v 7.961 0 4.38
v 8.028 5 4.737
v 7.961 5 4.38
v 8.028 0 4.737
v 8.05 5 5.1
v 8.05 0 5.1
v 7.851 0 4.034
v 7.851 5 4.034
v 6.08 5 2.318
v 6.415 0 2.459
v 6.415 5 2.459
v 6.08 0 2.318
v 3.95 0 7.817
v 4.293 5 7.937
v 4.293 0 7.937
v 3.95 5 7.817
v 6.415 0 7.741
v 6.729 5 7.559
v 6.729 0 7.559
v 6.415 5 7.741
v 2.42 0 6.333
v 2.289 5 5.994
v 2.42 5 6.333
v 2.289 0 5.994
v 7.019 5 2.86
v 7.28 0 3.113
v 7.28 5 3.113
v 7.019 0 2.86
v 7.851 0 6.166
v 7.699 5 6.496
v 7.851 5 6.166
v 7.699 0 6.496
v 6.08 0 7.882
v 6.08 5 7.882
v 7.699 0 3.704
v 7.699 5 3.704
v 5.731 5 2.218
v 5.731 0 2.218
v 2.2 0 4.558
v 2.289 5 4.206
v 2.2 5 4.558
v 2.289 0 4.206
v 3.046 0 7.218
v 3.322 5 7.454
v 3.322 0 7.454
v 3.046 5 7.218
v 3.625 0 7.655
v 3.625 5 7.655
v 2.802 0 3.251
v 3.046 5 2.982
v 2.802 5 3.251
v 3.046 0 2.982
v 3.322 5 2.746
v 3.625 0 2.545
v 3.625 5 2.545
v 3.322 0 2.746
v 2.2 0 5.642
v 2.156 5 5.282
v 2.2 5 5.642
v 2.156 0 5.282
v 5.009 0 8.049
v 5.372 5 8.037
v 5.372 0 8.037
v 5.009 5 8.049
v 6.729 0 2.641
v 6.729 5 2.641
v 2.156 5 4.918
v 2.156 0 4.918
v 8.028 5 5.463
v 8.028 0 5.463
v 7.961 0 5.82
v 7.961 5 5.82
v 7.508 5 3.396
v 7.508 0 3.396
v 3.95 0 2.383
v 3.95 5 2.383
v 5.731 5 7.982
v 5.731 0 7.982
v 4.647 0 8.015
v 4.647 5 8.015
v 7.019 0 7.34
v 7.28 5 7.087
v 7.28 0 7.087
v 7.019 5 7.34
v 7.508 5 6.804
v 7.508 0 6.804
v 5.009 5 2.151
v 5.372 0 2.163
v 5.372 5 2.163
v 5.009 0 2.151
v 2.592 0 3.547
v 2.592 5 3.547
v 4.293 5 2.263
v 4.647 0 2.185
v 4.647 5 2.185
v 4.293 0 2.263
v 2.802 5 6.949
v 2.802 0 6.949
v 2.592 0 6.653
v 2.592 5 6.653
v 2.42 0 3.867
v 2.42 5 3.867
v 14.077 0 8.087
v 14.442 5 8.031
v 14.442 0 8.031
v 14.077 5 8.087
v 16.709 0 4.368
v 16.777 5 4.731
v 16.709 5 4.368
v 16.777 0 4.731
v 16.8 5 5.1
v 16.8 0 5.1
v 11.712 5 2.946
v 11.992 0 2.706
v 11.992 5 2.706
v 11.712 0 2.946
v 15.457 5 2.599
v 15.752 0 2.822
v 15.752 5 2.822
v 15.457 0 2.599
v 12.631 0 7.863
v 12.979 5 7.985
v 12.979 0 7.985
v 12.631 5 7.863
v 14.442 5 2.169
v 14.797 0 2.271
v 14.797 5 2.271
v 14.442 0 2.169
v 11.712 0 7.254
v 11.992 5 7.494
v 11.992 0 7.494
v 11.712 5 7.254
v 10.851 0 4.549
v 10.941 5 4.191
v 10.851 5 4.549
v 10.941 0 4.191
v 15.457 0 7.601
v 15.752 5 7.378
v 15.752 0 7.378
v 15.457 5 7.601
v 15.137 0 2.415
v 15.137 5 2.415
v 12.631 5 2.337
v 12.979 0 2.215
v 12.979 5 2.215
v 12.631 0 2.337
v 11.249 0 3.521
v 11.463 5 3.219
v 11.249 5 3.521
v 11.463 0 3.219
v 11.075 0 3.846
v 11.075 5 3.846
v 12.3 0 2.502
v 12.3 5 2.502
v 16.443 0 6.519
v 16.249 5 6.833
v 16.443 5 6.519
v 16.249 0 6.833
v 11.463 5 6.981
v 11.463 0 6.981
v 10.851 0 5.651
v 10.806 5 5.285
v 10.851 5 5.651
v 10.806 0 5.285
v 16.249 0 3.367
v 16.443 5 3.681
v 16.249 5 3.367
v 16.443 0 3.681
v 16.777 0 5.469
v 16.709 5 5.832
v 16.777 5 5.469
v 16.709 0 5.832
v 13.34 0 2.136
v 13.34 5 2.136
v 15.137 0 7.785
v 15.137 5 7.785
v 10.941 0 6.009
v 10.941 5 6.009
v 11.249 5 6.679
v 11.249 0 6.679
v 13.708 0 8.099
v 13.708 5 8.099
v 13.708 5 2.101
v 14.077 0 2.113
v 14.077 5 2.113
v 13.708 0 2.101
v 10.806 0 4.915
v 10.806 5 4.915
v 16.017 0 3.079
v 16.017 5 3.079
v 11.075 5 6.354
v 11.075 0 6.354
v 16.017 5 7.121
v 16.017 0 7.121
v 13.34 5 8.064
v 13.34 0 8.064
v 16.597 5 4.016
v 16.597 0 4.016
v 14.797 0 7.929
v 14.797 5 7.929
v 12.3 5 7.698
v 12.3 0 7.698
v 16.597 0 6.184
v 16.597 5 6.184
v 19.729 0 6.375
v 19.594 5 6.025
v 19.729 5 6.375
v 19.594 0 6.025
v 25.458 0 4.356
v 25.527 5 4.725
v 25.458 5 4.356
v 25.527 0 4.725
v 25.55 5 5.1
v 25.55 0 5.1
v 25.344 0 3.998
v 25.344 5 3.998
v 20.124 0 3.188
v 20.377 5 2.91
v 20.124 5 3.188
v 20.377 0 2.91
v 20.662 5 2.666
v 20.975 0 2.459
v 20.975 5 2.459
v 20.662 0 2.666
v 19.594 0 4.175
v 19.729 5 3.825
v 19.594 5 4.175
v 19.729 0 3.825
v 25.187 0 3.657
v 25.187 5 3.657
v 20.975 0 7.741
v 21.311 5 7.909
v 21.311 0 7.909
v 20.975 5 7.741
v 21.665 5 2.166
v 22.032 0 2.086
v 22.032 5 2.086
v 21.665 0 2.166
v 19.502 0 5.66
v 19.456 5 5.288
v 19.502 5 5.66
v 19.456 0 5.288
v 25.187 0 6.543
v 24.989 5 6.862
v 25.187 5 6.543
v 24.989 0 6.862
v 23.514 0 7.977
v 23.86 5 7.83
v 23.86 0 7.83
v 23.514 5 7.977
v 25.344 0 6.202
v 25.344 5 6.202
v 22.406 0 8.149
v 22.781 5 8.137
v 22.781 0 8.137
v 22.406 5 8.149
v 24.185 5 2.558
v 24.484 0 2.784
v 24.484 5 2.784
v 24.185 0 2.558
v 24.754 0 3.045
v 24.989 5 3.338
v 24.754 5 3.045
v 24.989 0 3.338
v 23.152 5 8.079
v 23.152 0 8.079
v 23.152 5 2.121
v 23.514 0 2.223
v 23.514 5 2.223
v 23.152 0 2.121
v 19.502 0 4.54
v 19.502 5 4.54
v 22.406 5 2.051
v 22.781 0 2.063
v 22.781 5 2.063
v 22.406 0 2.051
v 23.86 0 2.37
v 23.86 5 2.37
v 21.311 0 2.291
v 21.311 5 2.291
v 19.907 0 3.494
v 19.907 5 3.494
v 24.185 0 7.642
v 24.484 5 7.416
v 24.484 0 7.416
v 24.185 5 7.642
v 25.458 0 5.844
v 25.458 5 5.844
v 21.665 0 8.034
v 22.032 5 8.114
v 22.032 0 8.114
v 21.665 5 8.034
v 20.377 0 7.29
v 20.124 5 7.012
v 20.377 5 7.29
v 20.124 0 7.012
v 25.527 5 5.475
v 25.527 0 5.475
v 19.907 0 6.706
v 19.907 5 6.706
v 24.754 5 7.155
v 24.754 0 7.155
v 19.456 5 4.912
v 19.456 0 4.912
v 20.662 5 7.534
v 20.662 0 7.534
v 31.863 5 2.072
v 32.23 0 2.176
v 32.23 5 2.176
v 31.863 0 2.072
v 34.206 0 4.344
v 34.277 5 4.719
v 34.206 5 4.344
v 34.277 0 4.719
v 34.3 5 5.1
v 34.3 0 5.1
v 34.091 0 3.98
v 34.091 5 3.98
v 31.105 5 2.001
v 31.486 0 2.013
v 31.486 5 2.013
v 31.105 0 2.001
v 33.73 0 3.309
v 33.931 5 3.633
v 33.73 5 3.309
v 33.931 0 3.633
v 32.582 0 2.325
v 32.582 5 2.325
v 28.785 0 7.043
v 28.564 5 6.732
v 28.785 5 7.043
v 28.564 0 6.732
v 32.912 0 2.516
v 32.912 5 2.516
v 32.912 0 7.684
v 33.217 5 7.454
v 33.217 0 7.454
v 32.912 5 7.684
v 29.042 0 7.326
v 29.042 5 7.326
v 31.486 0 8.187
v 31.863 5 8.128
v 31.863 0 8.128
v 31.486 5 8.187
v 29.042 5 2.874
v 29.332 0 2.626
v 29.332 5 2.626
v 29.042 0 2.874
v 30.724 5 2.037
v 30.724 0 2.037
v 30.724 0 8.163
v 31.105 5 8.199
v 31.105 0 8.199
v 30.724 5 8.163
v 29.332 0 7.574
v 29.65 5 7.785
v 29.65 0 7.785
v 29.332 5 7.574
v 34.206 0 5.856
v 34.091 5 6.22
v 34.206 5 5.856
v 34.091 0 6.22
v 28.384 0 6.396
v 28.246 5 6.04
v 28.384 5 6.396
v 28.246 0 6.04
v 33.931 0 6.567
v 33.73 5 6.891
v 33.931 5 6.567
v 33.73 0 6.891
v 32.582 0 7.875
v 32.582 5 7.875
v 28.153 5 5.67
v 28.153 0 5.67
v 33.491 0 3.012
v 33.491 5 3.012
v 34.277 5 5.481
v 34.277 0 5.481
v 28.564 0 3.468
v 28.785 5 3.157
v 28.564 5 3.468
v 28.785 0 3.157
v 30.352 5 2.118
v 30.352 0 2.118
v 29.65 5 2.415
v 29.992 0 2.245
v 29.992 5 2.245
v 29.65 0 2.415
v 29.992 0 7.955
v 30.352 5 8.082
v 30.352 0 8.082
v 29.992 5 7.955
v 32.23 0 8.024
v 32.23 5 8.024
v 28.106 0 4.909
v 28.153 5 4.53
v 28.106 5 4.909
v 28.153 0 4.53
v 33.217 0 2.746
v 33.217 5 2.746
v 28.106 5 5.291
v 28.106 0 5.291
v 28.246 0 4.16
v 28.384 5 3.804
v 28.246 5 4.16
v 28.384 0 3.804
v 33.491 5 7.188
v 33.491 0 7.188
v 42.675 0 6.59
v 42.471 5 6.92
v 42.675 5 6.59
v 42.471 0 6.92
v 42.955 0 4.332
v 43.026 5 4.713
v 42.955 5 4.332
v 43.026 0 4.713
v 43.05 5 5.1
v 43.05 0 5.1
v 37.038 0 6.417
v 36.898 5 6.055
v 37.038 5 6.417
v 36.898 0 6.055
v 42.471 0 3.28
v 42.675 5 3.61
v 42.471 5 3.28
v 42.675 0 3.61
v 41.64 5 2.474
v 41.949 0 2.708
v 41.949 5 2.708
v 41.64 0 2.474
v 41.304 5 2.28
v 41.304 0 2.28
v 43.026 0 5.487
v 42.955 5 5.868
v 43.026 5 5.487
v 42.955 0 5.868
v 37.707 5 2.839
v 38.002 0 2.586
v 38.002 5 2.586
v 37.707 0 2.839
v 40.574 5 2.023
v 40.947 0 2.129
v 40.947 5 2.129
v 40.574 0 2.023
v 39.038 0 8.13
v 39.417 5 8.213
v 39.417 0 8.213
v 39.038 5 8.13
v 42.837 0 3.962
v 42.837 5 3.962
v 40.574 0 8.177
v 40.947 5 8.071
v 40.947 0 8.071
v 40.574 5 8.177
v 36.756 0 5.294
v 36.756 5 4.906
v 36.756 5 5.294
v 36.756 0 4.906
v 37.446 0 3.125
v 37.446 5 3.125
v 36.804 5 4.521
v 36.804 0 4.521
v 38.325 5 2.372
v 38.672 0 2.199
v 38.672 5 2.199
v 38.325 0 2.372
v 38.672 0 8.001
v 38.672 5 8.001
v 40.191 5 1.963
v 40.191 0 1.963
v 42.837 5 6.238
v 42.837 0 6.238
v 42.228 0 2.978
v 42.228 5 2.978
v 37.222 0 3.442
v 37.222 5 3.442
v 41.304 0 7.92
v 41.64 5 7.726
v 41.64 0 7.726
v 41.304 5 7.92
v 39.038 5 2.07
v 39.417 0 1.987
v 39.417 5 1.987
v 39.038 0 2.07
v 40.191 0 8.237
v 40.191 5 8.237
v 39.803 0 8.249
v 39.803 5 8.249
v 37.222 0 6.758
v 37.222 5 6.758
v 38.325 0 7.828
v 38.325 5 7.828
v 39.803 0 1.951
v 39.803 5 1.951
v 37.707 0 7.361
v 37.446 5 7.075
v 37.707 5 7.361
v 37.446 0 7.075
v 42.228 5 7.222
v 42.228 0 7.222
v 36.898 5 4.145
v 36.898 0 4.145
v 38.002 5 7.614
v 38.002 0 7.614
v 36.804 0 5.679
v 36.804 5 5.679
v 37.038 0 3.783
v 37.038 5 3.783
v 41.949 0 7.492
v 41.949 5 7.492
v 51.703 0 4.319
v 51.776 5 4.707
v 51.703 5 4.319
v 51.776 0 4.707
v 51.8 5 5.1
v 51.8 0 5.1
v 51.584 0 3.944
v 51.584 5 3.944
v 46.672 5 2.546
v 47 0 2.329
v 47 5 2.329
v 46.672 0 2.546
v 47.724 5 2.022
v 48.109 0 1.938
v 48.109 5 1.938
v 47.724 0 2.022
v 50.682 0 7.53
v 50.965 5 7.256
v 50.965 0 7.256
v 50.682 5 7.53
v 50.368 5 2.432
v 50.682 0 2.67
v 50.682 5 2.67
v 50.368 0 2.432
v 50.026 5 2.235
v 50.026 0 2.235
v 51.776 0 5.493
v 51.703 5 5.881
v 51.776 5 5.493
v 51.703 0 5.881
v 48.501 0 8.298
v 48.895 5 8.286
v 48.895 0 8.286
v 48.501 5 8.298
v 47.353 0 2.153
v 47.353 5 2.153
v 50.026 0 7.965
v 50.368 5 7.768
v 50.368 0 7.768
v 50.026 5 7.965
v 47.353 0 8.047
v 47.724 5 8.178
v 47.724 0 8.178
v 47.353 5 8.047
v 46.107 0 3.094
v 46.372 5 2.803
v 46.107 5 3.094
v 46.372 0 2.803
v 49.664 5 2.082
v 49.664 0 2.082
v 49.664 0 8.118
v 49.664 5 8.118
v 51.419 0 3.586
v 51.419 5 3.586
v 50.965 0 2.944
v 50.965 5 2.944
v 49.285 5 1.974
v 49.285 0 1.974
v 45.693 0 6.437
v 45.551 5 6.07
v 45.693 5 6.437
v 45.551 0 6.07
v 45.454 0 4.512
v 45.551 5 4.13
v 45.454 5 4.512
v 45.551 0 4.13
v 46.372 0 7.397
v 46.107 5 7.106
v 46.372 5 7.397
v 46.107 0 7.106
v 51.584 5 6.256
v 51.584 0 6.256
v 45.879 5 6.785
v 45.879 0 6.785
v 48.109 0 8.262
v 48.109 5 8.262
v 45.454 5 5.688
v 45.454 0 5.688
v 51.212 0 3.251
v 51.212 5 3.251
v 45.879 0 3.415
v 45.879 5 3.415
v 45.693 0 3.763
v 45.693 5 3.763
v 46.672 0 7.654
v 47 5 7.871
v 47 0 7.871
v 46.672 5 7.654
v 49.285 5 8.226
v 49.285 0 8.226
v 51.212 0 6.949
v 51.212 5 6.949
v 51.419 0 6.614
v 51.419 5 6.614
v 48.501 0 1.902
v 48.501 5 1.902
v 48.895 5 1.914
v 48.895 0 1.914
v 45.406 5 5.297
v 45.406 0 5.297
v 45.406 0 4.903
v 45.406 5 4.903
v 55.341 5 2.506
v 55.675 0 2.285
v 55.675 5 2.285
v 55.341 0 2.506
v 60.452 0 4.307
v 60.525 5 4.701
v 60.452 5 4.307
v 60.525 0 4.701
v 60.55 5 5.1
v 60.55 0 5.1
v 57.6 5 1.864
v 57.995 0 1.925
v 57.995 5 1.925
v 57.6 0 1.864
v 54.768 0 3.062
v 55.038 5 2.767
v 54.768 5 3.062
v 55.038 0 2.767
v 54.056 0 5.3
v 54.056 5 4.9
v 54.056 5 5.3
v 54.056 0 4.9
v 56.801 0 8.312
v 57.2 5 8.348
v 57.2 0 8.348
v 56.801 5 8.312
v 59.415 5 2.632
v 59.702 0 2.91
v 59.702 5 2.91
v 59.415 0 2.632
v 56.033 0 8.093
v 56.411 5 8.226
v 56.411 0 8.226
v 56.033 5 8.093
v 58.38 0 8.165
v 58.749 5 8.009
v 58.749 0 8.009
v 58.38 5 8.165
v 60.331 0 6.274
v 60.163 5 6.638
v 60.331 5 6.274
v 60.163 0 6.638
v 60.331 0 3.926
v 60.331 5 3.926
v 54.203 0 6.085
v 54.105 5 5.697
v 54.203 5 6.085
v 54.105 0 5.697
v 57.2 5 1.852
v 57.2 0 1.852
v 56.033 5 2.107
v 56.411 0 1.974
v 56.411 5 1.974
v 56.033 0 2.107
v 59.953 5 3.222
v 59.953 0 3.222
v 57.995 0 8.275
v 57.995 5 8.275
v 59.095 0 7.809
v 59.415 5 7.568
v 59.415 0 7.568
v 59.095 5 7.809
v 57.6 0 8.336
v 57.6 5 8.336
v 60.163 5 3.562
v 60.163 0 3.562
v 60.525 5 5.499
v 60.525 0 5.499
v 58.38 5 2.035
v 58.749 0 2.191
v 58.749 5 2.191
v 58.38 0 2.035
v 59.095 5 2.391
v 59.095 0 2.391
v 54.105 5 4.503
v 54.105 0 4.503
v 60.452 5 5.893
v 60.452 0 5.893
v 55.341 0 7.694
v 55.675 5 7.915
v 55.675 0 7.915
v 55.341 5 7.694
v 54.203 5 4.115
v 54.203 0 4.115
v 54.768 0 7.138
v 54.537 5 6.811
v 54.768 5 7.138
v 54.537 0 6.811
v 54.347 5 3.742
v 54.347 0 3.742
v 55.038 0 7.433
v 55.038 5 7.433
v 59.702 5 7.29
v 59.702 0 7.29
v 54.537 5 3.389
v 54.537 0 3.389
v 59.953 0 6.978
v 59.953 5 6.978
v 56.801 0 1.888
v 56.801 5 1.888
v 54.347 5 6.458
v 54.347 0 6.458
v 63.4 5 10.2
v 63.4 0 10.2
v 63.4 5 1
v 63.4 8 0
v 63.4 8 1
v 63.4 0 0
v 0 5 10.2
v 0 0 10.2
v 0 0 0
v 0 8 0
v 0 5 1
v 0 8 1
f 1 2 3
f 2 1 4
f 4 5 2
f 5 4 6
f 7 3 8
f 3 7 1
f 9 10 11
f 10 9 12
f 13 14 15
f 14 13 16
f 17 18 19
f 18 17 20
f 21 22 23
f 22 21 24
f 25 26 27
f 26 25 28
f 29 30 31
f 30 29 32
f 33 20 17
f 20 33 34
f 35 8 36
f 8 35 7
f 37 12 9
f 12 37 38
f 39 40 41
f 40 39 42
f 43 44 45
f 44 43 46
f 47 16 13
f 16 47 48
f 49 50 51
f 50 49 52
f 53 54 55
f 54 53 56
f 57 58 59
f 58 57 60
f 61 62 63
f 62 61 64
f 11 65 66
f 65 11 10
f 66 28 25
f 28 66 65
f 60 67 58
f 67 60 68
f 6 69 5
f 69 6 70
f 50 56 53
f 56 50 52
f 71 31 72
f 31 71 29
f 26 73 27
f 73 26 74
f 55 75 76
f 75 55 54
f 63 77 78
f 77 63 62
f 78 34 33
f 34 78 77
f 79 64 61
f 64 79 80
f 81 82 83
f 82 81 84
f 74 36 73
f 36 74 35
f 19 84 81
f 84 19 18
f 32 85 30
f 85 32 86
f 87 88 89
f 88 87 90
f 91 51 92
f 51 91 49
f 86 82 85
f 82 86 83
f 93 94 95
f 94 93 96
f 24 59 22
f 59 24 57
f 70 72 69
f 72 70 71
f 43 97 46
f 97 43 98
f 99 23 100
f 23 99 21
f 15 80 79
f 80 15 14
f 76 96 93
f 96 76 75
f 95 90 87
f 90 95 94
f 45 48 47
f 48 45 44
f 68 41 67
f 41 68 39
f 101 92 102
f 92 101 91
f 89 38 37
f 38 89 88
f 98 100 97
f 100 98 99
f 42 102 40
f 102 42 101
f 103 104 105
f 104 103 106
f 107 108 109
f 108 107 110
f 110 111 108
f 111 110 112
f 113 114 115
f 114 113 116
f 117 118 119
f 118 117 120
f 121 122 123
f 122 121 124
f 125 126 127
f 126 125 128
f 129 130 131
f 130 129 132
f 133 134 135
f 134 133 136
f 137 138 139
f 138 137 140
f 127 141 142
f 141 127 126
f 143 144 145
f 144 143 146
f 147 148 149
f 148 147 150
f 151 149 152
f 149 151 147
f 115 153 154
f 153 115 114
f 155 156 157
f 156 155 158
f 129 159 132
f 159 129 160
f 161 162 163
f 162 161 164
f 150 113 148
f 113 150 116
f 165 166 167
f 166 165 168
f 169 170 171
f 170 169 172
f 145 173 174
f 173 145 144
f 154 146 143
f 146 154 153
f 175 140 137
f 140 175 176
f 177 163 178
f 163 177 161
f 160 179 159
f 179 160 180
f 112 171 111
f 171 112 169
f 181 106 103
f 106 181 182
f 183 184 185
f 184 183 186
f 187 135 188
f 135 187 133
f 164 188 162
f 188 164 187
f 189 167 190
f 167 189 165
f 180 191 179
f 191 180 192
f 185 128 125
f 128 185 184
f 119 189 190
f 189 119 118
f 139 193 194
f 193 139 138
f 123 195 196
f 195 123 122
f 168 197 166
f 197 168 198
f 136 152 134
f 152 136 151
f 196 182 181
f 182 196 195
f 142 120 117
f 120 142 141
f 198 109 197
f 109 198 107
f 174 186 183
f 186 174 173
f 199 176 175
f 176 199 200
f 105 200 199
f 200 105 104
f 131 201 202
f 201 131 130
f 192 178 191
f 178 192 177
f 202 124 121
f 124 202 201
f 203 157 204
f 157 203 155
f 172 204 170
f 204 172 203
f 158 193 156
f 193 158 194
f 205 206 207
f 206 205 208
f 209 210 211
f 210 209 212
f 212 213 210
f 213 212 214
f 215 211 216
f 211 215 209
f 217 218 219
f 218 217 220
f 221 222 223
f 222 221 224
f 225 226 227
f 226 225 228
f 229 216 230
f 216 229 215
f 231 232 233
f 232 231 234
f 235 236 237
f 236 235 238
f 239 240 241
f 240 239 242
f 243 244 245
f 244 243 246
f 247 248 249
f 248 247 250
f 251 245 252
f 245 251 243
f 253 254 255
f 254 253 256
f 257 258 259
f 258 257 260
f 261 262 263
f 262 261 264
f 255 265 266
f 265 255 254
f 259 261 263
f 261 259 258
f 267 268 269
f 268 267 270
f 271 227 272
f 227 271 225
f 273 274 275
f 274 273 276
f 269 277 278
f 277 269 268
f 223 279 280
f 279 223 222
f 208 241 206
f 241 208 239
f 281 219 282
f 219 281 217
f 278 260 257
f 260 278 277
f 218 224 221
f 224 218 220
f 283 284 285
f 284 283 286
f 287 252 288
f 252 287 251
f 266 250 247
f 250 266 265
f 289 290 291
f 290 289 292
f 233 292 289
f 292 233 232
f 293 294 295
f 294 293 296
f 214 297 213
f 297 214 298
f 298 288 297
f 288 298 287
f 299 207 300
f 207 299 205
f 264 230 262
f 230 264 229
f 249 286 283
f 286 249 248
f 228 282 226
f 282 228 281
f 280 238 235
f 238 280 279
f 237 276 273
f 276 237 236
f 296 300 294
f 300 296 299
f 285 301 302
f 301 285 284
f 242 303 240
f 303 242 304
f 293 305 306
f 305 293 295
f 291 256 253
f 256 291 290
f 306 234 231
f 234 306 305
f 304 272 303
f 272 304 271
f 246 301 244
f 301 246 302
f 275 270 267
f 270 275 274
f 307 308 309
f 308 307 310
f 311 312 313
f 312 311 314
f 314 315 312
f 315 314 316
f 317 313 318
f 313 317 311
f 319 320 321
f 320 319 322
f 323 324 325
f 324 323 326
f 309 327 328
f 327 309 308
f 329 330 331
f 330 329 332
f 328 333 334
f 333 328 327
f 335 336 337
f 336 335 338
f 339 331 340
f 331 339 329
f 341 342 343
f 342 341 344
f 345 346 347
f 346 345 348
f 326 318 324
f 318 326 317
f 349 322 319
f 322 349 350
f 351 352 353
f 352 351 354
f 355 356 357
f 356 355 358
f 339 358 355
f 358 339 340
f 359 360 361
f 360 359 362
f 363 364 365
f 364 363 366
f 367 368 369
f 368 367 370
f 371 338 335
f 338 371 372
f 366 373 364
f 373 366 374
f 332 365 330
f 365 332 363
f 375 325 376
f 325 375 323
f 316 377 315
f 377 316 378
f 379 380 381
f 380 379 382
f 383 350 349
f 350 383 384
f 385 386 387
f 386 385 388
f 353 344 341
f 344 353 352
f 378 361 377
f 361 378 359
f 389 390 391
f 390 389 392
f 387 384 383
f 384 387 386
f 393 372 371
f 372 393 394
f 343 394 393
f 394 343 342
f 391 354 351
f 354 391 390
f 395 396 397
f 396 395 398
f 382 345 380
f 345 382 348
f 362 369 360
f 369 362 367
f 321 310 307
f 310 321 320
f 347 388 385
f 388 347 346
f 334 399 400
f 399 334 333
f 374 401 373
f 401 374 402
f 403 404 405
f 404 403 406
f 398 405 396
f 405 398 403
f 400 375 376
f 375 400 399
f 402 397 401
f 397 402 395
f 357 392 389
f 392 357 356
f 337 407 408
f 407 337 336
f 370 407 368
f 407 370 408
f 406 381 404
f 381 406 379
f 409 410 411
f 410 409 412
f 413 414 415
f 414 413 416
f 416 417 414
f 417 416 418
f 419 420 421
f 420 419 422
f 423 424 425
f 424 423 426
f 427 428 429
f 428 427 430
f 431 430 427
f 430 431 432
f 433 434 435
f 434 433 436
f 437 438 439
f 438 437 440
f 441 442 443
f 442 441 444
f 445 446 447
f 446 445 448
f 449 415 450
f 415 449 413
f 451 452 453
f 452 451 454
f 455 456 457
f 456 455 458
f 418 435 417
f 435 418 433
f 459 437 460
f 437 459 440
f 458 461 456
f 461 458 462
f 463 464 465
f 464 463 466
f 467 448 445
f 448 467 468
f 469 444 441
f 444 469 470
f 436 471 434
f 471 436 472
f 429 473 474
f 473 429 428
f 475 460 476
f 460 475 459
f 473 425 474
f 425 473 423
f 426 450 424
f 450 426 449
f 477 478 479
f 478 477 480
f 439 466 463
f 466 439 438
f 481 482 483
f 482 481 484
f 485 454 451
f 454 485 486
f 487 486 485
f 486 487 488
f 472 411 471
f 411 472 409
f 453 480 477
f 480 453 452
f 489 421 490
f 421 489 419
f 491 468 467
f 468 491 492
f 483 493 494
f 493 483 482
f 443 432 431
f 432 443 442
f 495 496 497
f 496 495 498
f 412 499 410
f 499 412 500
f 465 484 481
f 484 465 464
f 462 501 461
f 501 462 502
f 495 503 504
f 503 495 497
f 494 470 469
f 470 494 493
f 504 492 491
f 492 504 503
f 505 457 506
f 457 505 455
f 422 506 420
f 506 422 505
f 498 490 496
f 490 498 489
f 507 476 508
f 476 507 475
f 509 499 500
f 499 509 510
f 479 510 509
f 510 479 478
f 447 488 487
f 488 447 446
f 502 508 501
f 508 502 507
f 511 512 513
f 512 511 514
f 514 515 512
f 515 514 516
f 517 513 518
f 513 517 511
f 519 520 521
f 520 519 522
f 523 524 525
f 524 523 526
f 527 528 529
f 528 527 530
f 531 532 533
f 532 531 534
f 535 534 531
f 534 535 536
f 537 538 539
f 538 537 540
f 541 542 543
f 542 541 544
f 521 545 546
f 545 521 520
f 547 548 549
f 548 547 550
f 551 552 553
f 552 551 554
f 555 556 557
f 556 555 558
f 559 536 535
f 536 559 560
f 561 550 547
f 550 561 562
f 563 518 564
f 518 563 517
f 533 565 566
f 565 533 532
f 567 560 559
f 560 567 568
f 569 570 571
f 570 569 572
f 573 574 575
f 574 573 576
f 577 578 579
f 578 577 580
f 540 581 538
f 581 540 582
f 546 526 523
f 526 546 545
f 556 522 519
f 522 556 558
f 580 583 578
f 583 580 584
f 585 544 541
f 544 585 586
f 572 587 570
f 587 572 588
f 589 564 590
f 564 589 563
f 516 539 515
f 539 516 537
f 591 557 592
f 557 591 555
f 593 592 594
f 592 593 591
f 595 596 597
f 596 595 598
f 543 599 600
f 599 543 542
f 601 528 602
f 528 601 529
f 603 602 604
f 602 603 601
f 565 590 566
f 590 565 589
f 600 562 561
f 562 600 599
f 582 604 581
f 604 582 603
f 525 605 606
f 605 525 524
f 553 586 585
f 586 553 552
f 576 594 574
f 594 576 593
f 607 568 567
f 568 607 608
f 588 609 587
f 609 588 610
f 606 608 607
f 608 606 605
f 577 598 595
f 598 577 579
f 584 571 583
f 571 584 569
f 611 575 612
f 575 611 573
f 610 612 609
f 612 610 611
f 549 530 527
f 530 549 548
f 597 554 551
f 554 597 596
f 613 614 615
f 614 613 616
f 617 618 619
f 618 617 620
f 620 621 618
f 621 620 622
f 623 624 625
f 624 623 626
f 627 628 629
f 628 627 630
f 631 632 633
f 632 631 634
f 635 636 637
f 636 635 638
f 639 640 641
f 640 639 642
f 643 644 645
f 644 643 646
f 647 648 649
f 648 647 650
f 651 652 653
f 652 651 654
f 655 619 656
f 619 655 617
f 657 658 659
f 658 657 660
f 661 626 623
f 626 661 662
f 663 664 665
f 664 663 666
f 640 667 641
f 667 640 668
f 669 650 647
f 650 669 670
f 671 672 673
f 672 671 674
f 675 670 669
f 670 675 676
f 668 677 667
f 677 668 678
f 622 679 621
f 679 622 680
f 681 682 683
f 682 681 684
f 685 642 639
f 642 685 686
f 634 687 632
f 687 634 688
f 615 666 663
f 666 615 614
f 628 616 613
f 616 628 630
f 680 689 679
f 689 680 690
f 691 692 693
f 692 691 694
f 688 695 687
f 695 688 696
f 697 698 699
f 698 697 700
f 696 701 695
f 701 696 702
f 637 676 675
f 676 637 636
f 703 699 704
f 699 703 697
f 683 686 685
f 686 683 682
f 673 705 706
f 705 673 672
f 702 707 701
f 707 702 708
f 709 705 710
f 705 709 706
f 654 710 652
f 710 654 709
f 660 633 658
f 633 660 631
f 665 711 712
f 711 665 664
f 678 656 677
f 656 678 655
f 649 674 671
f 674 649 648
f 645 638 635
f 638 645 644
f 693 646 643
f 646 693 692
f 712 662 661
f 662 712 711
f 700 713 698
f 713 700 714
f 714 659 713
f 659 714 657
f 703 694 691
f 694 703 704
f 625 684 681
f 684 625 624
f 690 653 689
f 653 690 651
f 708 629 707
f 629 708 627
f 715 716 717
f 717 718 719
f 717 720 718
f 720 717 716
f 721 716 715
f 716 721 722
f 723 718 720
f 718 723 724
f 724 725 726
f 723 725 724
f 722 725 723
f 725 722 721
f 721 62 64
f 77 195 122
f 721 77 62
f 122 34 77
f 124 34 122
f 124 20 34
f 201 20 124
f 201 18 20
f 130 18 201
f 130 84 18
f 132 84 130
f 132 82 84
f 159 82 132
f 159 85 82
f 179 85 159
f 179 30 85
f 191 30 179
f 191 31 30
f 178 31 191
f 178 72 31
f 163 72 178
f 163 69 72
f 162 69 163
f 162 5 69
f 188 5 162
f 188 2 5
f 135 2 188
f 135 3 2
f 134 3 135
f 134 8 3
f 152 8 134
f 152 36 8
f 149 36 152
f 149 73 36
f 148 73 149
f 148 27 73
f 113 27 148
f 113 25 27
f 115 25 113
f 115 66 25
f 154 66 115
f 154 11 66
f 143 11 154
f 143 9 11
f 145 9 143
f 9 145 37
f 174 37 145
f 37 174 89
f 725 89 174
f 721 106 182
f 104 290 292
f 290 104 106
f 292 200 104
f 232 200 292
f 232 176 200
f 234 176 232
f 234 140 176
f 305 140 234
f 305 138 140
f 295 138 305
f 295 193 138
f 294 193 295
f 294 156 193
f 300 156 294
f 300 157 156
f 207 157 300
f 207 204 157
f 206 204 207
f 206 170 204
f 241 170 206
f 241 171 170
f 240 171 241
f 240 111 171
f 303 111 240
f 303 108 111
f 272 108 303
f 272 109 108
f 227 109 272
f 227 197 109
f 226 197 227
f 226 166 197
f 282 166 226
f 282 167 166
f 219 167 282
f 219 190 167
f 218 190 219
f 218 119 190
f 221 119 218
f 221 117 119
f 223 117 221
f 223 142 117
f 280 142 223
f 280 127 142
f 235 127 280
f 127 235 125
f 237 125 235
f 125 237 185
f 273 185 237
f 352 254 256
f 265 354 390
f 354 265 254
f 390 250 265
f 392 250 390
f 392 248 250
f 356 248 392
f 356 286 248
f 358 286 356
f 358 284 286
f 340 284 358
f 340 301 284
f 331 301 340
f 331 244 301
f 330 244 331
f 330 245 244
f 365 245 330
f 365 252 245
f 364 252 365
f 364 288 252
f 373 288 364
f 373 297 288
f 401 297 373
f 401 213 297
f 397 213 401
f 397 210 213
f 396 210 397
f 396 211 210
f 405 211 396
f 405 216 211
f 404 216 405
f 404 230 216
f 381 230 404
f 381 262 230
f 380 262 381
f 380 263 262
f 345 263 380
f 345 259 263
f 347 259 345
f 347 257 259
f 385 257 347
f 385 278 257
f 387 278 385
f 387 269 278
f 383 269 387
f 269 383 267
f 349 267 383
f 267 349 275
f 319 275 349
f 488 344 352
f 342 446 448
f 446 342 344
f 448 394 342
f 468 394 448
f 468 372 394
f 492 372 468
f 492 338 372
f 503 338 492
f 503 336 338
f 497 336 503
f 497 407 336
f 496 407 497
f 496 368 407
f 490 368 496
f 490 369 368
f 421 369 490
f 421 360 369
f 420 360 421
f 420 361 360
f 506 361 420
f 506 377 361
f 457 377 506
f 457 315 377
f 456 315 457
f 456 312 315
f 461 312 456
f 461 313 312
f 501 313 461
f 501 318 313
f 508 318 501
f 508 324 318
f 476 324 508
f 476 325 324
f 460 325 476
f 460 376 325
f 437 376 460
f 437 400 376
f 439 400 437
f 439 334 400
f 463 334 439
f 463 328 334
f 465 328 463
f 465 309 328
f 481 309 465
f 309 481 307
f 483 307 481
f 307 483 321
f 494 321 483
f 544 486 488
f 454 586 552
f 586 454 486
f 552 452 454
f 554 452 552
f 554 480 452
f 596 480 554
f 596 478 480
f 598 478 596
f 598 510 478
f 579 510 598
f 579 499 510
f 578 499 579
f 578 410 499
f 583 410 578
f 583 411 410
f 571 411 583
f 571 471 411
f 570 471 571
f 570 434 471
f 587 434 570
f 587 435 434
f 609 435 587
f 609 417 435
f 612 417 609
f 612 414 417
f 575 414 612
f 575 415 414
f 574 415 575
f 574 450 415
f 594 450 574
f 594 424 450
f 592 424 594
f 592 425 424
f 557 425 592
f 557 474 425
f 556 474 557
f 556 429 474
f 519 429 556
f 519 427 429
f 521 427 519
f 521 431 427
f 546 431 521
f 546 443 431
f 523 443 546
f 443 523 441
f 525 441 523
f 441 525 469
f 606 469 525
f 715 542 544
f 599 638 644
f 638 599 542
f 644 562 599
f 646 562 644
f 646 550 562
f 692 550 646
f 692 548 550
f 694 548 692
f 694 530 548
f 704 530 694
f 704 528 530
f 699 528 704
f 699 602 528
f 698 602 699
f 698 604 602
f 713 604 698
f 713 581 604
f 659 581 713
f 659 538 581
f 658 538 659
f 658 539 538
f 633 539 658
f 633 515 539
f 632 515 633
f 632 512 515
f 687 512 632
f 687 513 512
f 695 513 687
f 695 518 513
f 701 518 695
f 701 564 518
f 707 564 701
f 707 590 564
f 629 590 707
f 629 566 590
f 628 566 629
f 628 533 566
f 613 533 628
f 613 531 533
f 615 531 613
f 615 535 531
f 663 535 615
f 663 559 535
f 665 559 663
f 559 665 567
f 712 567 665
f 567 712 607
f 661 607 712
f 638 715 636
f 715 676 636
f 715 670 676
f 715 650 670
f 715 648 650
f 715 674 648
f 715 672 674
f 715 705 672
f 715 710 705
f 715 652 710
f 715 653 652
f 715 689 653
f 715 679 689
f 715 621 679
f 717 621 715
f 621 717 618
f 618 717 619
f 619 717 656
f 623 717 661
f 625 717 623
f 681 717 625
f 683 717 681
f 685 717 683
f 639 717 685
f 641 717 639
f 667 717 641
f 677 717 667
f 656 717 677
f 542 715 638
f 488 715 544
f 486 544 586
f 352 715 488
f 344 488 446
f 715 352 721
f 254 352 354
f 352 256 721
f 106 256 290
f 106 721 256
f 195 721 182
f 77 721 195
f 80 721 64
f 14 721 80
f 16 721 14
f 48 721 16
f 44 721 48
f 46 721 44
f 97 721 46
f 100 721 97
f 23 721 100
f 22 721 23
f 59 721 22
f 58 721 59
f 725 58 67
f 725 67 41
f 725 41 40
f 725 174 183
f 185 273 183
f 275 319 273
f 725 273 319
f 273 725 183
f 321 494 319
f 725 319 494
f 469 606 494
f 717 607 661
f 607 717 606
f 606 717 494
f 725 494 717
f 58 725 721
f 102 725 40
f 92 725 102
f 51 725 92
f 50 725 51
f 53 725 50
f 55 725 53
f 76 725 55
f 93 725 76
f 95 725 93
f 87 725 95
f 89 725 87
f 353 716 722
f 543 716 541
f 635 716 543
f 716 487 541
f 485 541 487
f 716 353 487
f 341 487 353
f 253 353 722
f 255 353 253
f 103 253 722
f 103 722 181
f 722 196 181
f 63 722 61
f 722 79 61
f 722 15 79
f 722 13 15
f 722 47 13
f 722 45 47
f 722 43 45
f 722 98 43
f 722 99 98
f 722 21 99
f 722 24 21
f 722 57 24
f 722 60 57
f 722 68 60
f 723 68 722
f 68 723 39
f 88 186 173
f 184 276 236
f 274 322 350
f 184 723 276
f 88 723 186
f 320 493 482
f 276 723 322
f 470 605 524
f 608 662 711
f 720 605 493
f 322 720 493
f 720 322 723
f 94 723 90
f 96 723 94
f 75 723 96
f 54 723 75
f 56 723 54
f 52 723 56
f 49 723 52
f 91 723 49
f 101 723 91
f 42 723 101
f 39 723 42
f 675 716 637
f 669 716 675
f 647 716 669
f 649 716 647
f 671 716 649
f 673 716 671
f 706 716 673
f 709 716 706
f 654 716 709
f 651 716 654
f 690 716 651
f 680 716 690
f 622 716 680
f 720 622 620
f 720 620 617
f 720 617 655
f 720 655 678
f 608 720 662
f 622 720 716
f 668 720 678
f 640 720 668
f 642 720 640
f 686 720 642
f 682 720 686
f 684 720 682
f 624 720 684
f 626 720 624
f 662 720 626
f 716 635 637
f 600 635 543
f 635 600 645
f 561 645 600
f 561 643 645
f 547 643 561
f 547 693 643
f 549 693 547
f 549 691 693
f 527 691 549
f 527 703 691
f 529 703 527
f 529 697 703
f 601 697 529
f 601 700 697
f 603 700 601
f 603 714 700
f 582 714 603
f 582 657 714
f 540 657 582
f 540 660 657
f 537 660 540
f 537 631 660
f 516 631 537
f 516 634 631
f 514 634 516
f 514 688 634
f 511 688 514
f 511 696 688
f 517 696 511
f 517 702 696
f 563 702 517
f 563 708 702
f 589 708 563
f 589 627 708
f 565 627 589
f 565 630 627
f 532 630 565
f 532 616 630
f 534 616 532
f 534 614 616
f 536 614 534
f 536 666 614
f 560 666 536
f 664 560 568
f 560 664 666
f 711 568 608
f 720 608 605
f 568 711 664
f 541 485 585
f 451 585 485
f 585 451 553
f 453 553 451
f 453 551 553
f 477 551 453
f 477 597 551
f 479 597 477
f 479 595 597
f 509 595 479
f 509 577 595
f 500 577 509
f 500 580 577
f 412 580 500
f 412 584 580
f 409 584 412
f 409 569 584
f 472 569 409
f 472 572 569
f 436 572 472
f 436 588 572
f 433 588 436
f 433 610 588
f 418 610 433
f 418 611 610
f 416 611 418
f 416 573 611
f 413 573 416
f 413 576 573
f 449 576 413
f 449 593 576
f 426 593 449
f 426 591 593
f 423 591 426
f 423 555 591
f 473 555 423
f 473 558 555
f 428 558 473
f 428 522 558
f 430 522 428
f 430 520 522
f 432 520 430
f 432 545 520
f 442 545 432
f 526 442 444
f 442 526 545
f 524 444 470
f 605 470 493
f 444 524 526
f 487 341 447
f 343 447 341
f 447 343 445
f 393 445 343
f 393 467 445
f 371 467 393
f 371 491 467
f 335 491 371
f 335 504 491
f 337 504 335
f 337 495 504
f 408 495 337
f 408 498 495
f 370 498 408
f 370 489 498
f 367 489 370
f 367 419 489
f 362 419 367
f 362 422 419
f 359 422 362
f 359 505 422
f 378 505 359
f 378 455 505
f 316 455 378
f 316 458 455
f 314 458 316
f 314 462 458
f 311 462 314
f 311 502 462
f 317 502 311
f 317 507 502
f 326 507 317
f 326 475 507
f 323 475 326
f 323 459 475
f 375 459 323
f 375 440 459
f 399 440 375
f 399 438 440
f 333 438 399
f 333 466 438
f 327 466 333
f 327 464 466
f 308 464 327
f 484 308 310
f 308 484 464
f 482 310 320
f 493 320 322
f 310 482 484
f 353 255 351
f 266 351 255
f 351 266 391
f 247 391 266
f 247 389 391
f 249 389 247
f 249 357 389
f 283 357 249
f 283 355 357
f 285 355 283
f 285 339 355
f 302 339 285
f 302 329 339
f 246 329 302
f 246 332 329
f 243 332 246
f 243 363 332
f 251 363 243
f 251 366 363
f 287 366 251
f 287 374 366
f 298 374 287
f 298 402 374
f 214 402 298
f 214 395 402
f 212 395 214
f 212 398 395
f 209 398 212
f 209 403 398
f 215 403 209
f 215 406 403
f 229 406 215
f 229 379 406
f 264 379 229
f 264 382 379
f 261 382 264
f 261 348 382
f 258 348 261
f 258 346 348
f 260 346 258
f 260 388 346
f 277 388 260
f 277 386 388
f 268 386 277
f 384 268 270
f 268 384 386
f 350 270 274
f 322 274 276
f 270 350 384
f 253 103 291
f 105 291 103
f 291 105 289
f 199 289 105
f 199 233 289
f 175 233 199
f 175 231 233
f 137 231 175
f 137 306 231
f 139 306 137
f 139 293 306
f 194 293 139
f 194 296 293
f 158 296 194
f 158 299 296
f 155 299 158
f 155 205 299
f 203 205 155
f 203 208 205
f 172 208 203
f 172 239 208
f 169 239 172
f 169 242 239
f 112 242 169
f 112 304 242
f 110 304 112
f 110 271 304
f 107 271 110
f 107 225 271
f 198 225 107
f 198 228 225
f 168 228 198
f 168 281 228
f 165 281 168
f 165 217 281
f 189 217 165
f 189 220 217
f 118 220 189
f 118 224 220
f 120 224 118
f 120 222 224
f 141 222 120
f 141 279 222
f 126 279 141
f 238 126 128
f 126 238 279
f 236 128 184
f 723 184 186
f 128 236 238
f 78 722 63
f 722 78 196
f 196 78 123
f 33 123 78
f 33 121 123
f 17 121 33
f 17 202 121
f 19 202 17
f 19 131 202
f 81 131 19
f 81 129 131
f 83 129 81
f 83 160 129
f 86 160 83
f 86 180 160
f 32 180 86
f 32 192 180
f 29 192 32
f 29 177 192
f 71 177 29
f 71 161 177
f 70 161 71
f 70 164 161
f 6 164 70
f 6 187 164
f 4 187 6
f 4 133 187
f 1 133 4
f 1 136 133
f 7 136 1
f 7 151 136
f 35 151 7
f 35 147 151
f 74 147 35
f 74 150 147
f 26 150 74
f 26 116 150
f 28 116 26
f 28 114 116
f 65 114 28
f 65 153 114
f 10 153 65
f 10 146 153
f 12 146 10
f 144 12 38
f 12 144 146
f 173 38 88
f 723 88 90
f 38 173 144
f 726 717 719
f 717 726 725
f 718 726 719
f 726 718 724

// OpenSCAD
$fn=51;
module testBoard(d_center=6.2, step=0.1, no=7){
    difference(){
        cube([d_center * no + 2.5 * (no + 1), 5, d_center + 4]);
        for (i=[0:no-1]){
            d_start = d_center - step * (no - 1) / 2;
            d = d_start+step*i;
            echo(d);
            translate([(d_center + 2.5)*i + d_center/2+ 2, -0.01, d_center/ 2 + 2])
              rotate(-90, [1, 0, 0])
              cylinder(d=d, h=20);
            }
        }
cube([d_center * no + 2.5 * (no + 1), 8, 1]);
}

testBoard();
